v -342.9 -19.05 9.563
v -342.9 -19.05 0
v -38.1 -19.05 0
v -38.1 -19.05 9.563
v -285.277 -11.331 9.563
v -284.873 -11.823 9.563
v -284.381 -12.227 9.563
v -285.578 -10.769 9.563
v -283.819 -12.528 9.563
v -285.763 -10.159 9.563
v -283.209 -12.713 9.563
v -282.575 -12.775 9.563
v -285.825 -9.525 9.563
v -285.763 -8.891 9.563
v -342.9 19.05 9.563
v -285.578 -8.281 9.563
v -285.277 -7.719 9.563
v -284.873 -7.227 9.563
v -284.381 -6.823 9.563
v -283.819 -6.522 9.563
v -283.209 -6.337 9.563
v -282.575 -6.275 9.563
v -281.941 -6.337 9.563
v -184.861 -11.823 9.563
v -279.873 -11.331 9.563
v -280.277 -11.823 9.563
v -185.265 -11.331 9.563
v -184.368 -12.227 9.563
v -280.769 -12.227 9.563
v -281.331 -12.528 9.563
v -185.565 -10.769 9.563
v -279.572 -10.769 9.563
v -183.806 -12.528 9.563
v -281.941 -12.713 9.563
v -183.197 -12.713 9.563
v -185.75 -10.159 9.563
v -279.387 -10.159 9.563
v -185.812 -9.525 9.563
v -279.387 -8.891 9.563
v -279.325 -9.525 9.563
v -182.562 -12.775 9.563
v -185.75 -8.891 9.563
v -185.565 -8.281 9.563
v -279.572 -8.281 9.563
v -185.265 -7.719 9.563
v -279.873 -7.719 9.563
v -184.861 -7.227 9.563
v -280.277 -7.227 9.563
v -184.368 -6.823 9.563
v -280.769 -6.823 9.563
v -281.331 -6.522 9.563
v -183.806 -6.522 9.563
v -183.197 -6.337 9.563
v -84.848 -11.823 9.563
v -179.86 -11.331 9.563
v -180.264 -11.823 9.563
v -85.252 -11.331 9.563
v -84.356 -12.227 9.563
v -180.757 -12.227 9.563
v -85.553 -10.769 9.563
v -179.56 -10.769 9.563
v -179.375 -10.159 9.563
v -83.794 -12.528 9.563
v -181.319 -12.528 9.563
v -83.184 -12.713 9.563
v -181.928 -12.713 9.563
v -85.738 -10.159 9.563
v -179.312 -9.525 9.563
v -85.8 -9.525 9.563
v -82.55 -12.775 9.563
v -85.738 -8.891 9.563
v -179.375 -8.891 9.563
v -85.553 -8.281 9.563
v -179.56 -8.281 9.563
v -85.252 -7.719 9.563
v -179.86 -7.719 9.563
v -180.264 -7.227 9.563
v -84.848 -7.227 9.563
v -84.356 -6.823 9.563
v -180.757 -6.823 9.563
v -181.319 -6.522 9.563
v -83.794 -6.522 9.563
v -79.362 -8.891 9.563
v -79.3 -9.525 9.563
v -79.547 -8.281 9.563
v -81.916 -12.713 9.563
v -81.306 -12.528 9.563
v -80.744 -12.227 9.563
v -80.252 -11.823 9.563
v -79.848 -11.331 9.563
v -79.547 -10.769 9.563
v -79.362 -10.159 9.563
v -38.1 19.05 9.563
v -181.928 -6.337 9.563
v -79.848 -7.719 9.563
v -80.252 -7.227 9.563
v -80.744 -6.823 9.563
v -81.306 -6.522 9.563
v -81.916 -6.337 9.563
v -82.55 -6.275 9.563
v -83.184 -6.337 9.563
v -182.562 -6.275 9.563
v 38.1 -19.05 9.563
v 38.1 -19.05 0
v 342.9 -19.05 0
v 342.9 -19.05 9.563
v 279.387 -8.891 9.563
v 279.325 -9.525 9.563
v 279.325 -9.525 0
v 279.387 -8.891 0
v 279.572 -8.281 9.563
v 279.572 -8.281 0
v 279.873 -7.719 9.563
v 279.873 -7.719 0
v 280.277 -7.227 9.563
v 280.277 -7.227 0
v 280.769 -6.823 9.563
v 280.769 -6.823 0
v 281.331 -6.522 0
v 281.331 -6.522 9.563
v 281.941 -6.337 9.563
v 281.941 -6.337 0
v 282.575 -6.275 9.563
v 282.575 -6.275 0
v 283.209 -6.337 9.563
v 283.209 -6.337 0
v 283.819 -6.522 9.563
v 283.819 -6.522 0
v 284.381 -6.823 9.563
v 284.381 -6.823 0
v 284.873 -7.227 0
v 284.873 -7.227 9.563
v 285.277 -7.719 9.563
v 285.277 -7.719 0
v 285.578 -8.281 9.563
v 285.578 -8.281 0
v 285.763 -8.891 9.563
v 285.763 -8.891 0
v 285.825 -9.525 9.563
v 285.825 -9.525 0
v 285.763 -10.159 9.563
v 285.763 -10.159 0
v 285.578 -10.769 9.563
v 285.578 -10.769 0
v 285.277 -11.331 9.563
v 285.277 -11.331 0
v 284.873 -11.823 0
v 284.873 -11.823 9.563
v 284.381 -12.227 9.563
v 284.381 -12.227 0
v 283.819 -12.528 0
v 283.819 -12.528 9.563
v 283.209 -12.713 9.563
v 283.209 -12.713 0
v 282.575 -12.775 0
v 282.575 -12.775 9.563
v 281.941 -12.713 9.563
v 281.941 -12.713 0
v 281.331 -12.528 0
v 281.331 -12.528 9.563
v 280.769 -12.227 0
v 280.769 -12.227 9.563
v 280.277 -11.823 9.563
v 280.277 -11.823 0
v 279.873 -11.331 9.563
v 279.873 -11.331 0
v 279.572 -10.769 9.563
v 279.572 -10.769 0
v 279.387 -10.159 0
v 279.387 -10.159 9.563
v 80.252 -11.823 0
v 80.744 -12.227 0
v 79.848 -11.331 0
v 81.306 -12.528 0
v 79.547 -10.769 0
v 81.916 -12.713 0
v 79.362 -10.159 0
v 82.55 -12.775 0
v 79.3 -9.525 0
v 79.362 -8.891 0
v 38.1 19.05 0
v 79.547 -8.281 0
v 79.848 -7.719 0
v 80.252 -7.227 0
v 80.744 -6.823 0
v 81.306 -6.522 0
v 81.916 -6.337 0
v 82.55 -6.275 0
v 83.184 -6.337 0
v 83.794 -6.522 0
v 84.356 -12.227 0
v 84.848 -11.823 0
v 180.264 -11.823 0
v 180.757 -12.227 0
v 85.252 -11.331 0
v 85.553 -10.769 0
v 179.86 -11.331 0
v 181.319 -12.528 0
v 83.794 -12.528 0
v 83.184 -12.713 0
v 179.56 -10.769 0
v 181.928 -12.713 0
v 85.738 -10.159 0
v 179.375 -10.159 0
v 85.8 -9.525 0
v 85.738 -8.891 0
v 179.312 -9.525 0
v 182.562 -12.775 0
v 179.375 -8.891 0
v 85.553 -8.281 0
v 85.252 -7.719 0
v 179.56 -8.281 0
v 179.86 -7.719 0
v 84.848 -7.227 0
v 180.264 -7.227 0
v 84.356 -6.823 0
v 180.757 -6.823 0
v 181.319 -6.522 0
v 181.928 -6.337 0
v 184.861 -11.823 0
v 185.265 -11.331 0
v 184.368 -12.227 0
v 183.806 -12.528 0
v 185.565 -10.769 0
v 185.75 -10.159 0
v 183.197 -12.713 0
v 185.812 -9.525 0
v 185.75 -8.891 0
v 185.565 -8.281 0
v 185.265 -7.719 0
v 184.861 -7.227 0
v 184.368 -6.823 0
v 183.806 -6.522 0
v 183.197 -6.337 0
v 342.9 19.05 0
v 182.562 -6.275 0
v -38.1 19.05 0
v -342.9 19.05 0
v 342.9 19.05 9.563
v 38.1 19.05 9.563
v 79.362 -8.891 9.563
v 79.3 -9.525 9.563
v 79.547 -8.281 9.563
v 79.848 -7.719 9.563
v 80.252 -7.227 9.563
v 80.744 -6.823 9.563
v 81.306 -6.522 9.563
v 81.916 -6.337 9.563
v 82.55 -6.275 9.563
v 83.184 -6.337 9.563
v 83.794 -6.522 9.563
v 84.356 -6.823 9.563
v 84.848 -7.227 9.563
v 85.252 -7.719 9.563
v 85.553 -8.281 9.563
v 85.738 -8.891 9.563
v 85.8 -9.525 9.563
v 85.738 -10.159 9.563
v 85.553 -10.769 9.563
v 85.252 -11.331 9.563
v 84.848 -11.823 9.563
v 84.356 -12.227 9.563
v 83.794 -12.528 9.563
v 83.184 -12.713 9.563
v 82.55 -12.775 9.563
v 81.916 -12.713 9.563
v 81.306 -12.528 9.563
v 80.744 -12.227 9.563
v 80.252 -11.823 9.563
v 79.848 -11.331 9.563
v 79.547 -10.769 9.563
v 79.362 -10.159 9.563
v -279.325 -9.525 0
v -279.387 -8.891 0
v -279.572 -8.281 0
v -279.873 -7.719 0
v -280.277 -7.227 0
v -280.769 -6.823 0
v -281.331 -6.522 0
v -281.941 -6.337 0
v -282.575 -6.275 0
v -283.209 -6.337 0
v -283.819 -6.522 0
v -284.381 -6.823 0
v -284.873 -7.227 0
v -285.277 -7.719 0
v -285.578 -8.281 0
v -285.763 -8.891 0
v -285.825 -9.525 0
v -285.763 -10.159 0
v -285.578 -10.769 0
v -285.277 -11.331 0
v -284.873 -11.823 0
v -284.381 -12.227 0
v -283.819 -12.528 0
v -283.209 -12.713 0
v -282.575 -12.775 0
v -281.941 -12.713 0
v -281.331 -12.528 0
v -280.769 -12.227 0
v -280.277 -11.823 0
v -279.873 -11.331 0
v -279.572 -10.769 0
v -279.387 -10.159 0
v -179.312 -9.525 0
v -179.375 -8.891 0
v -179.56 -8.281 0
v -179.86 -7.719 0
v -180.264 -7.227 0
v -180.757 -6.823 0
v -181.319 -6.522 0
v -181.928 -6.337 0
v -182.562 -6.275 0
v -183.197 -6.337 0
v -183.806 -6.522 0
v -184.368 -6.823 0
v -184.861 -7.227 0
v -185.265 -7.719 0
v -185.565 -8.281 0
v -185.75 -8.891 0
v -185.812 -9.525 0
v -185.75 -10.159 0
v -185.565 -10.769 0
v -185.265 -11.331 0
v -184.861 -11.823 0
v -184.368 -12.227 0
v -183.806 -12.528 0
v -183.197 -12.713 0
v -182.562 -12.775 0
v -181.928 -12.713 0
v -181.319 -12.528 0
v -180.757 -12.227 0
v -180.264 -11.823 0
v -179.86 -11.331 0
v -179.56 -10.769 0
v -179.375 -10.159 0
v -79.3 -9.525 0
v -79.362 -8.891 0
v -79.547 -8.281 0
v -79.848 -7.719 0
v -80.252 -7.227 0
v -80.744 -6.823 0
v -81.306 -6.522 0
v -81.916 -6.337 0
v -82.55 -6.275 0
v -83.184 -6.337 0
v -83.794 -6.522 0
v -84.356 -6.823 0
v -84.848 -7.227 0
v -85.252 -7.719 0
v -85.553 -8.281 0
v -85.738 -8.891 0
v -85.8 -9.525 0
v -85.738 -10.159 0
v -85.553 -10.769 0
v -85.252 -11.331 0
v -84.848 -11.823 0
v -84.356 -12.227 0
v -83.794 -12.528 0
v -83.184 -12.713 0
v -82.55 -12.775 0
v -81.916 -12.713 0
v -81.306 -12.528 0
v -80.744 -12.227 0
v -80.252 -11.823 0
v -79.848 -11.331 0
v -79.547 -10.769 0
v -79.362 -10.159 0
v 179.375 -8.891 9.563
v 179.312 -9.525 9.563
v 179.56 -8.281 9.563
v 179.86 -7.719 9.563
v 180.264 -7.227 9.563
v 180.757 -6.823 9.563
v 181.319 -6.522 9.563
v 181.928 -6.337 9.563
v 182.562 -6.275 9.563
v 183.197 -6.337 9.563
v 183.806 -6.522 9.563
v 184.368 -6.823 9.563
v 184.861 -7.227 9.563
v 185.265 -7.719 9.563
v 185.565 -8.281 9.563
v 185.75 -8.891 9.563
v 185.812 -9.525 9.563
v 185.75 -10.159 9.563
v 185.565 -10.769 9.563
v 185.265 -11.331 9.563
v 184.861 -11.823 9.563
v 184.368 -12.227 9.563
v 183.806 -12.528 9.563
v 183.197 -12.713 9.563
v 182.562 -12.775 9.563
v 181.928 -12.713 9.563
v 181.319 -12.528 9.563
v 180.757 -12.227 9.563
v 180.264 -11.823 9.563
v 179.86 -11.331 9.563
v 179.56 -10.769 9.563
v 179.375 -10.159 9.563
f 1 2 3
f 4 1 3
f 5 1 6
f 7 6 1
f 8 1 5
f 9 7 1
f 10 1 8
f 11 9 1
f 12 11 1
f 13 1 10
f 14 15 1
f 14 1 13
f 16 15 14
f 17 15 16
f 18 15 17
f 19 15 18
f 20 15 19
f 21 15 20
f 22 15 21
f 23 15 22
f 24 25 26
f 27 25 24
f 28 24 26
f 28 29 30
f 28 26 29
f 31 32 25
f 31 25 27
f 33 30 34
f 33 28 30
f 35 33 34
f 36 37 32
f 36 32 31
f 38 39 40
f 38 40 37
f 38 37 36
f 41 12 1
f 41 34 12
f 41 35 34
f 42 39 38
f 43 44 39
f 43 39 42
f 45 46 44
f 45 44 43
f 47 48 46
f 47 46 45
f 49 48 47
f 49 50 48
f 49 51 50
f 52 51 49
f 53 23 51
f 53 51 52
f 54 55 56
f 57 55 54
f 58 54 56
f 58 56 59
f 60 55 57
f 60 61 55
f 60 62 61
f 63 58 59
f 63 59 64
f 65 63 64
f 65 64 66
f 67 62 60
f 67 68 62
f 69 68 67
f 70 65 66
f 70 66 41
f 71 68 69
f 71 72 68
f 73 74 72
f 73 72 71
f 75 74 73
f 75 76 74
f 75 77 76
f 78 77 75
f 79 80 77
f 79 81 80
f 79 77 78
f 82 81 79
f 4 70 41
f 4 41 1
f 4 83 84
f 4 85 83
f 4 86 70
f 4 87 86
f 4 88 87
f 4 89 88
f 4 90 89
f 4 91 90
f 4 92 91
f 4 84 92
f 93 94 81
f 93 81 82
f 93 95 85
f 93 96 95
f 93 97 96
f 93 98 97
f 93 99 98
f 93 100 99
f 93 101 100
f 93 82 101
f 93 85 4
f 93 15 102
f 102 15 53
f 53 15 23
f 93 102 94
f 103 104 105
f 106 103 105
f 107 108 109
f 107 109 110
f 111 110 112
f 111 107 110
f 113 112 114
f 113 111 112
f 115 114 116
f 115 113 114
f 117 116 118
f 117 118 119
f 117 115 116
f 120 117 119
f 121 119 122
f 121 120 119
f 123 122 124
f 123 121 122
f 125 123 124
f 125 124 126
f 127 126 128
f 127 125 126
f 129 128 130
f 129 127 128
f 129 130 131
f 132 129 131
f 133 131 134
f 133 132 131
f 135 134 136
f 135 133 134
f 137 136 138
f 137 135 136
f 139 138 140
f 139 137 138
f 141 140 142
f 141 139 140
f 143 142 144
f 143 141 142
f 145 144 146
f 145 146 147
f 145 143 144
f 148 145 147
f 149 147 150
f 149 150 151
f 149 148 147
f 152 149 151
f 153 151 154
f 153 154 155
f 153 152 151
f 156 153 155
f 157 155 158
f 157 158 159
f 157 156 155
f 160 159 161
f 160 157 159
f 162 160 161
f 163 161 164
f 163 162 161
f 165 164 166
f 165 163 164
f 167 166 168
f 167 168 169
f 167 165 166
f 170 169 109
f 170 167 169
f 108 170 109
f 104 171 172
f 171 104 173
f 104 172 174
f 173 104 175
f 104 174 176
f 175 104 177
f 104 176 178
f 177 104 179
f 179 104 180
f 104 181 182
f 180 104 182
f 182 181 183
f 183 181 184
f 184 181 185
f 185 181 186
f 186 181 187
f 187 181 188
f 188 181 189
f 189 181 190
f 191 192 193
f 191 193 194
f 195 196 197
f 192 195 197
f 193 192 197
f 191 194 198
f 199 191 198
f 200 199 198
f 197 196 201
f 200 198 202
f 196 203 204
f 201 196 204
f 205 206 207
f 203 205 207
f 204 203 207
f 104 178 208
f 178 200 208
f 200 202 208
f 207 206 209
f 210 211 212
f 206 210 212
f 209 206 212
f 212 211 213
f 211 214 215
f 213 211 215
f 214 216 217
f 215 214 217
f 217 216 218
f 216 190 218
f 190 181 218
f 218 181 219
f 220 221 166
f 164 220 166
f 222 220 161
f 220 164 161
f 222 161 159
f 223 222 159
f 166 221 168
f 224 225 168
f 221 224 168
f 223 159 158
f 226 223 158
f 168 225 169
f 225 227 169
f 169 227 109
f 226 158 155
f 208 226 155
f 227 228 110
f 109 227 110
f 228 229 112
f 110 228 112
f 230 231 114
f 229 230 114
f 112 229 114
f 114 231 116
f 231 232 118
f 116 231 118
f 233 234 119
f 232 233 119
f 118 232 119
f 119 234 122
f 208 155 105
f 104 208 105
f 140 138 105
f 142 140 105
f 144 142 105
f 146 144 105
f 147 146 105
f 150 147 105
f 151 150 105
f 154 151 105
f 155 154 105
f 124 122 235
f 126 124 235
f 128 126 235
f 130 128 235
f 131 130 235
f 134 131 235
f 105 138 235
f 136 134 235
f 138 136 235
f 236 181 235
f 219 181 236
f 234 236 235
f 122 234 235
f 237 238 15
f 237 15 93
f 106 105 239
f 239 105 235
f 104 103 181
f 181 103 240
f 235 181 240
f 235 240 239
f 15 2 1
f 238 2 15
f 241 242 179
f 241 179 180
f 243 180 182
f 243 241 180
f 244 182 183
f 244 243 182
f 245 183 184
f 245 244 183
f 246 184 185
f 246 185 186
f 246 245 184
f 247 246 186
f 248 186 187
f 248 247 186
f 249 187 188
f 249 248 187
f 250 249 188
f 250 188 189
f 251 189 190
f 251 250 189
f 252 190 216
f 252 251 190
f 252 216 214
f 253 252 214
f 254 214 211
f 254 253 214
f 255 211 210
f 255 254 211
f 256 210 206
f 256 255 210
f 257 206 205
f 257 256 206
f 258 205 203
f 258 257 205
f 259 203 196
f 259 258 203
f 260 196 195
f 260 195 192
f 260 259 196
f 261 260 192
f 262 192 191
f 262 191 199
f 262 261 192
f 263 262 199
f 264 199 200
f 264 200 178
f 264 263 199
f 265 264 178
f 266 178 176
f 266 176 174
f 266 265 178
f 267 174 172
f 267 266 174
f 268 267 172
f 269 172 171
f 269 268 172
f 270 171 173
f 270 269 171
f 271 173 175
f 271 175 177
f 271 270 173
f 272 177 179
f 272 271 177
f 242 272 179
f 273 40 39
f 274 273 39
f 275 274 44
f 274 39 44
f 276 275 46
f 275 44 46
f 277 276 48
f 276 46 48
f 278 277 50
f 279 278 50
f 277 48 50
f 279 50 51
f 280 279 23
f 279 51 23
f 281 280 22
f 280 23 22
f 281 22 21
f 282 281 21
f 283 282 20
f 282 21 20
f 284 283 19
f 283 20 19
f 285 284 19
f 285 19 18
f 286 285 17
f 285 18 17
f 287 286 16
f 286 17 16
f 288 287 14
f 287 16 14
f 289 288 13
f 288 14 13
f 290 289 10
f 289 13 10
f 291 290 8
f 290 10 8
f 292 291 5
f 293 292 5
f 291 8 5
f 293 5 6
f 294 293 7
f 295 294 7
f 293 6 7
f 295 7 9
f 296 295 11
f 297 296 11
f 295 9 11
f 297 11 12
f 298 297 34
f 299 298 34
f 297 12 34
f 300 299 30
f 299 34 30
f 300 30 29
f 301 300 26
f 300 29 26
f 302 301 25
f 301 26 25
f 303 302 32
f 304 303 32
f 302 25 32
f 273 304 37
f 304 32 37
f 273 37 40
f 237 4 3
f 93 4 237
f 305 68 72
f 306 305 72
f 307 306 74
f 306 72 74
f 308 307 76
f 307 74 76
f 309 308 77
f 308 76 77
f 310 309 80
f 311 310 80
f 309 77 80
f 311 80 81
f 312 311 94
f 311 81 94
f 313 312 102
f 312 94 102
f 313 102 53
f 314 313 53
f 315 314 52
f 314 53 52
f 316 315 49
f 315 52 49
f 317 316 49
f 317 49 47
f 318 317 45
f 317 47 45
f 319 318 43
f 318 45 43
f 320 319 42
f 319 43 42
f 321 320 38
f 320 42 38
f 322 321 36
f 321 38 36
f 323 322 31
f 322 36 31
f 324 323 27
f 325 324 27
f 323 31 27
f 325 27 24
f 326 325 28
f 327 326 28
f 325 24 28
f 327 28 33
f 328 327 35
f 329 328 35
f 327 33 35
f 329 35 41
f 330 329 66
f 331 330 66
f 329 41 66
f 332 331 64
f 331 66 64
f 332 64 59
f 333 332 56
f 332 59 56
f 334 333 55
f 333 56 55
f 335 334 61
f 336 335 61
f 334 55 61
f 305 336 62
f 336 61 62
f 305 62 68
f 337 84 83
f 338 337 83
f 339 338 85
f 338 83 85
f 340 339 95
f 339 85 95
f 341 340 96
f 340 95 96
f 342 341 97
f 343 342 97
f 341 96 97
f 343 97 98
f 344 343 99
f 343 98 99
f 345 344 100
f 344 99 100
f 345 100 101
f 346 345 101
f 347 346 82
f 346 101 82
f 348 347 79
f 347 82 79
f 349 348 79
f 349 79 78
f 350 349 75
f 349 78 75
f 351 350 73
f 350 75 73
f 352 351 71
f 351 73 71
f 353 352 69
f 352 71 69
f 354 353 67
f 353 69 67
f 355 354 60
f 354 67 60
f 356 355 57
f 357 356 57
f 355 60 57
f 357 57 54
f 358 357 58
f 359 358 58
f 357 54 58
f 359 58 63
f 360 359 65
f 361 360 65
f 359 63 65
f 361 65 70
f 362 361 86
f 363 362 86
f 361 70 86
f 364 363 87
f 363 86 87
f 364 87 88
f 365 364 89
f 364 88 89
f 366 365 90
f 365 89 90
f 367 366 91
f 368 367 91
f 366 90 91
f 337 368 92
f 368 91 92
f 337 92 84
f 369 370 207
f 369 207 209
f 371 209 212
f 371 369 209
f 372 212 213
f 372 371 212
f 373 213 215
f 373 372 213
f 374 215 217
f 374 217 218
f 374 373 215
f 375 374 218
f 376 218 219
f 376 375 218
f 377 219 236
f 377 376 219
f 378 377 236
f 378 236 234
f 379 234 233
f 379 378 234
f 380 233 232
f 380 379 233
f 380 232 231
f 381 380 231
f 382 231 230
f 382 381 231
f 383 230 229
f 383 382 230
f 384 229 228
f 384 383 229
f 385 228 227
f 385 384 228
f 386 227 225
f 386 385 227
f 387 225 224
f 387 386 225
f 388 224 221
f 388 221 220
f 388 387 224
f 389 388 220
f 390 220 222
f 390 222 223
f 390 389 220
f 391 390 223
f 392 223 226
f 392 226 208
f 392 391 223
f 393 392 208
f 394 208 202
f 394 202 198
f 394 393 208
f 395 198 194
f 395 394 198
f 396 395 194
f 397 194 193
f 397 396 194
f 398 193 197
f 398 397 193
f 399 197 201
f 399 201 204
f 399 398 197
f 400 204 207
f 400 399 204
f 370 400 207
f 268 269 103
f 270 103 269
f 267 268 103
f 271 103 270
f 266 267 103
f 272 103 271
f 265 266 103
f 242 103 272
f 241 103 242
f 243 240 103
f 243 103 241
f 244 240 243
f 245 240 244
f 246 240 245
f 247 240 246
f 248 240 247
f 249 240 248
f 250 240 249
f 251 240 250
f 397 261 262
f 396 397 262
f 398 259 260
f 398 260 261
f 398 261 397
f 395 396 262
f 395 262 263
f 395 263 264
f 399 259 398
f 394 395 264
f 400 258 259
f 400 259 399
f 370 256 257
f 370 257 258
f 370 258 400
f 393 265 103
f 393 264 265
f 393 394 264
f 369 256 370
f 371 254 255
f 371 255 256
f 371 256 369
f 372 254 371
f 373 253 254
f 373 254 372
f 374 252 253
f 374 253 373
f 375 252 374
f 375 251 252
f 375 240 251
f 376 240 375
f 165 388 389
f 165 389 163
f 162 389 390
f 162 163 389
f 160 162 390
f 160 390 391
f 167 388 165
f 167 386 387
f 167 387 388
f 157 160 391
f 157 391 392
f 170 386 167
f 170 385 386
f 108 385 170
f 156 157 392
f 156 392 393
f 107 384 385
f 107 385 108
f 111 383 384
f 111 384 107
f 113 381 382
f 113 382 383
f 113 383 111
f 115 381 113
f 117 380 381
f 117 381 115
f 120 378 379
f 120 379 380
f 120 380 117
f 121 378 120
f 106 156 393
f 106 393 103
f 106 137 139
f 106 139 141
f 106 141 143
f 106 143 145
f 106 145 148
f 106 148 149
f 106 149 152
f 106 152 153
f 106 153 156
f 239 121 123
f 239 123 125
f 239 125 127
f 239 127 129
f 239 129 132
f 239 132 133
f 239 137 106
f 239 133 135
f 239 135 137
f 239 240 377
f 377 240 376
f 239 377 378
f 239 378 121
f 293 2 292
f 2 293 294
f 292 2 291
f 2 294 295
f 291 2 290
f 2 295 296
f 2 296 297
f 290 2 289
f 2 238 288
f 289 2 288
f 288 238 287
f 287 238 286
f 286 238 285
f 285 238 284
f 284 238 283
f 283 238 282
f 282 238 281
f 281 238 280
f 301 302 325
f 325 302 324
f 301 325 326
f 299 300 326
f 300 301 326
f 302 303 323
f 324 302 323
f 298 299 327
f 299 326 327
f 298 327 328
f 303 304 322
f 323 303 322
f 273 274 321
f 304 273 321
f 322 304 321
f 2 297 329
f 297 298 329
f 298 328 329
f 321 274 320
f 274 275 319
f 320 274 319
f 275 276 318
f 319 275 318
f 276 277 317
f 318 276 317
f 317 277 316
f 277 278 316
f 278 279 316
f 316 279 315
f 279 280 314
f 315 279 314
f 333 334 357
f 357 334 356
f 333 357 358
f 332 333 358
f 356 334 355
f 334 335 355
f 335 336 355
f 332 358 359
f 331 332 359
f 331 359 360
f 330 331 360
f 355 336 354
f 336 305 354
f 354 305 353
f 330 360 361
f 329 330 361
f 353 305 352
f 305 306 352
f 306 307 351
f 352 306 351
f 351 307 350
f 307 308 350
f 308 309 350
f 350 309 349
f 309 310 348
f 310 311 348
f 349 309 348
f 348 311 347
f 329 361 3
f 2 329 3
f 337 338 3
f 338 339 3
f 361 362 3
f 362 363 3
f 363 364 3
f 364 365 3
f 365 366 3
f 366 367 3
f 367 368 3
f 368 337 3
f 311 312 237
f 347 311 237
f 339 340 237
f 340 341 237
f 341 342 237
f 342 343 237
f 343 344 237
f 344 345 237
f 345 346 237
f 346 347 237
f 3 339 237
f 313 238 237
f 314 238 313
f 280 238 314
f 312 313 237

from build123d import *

# Parameters (mm, degrees)
SKETCH1_W           = 685.8
SKETCH1_H           = 38.1
BOSS_EXTRUDE1_DEPTH = 9.5631
SKETCH2_R           = 3.25
CUT_EXTRUDE1_DEPTH  = 9.5631
SKETCH4_W           = 76.2
SKETCH4_H           = 38.1
CUT_EXTRUDE2_DEPTH  = 9.5631


with BuildPart() as part:
    # Sketch1 → Boss-Extrude1 (new body)
    with BuildSketch(Plane.XY):
        Rectangle(SKETCH1_W, SKETCH1_H)
    extrude(amount=BOSS_EXTRUDE1_DEPTH)

    # Sketch2 → Cut-Extrude1 (cut)
    with BuildSketch(Plane.XY.offset(9.5631)):
        with Locations((-282.575, -9.525)):
            Circle(SKETCH2_R)
        with Locations((-182.5625, -9.525)):
            Circle(SKETCH2_R)
        with Locations((-82.55, -9.525)):
            Circle(SKETCH2_R)
    cut_extrude1 = extrude(amount=-CUT_EXTRUDE1_DEPTH, mode=Mode.SUBTRACT)

    # Mirror1: Cut-Extrude1 across plane
    add(cut_extrude1.mirror(Plane.ZY), mode=Mode.SUBTRACT)

    # Sketch4 → Cut-Extrude2 (cut)
    with BuildSketch(Plane.XY.offset(9.5631)):
        Rectangle(SKETCH4_W, SKETCH4_H)
    extrude(amount=-CUT_EXTRUDE2_DEPTH, mode=Mode.SUBTRACT)


with BuildPart() as cut_extrude2_piece_1:
    # of the separate pieces the step leaves, piece 1, a body of its own (cut_extrude2_pieces)
    add(part.part.solids().sort_by_distance((-342.9, -19.05, 0))[0])


with BuildPart() as cut_extrude2_piece_2:
    # of the separate pieces the step leaves, piece 2, a body of its own (cut_extrude2_pieces)
    add(part.part.solids().sort_by_distance((38.1, -19.05, 0))[0])


solid = Compound([cut_extrude2_piece_1.part, cut_extrude2_piece_2.part])
